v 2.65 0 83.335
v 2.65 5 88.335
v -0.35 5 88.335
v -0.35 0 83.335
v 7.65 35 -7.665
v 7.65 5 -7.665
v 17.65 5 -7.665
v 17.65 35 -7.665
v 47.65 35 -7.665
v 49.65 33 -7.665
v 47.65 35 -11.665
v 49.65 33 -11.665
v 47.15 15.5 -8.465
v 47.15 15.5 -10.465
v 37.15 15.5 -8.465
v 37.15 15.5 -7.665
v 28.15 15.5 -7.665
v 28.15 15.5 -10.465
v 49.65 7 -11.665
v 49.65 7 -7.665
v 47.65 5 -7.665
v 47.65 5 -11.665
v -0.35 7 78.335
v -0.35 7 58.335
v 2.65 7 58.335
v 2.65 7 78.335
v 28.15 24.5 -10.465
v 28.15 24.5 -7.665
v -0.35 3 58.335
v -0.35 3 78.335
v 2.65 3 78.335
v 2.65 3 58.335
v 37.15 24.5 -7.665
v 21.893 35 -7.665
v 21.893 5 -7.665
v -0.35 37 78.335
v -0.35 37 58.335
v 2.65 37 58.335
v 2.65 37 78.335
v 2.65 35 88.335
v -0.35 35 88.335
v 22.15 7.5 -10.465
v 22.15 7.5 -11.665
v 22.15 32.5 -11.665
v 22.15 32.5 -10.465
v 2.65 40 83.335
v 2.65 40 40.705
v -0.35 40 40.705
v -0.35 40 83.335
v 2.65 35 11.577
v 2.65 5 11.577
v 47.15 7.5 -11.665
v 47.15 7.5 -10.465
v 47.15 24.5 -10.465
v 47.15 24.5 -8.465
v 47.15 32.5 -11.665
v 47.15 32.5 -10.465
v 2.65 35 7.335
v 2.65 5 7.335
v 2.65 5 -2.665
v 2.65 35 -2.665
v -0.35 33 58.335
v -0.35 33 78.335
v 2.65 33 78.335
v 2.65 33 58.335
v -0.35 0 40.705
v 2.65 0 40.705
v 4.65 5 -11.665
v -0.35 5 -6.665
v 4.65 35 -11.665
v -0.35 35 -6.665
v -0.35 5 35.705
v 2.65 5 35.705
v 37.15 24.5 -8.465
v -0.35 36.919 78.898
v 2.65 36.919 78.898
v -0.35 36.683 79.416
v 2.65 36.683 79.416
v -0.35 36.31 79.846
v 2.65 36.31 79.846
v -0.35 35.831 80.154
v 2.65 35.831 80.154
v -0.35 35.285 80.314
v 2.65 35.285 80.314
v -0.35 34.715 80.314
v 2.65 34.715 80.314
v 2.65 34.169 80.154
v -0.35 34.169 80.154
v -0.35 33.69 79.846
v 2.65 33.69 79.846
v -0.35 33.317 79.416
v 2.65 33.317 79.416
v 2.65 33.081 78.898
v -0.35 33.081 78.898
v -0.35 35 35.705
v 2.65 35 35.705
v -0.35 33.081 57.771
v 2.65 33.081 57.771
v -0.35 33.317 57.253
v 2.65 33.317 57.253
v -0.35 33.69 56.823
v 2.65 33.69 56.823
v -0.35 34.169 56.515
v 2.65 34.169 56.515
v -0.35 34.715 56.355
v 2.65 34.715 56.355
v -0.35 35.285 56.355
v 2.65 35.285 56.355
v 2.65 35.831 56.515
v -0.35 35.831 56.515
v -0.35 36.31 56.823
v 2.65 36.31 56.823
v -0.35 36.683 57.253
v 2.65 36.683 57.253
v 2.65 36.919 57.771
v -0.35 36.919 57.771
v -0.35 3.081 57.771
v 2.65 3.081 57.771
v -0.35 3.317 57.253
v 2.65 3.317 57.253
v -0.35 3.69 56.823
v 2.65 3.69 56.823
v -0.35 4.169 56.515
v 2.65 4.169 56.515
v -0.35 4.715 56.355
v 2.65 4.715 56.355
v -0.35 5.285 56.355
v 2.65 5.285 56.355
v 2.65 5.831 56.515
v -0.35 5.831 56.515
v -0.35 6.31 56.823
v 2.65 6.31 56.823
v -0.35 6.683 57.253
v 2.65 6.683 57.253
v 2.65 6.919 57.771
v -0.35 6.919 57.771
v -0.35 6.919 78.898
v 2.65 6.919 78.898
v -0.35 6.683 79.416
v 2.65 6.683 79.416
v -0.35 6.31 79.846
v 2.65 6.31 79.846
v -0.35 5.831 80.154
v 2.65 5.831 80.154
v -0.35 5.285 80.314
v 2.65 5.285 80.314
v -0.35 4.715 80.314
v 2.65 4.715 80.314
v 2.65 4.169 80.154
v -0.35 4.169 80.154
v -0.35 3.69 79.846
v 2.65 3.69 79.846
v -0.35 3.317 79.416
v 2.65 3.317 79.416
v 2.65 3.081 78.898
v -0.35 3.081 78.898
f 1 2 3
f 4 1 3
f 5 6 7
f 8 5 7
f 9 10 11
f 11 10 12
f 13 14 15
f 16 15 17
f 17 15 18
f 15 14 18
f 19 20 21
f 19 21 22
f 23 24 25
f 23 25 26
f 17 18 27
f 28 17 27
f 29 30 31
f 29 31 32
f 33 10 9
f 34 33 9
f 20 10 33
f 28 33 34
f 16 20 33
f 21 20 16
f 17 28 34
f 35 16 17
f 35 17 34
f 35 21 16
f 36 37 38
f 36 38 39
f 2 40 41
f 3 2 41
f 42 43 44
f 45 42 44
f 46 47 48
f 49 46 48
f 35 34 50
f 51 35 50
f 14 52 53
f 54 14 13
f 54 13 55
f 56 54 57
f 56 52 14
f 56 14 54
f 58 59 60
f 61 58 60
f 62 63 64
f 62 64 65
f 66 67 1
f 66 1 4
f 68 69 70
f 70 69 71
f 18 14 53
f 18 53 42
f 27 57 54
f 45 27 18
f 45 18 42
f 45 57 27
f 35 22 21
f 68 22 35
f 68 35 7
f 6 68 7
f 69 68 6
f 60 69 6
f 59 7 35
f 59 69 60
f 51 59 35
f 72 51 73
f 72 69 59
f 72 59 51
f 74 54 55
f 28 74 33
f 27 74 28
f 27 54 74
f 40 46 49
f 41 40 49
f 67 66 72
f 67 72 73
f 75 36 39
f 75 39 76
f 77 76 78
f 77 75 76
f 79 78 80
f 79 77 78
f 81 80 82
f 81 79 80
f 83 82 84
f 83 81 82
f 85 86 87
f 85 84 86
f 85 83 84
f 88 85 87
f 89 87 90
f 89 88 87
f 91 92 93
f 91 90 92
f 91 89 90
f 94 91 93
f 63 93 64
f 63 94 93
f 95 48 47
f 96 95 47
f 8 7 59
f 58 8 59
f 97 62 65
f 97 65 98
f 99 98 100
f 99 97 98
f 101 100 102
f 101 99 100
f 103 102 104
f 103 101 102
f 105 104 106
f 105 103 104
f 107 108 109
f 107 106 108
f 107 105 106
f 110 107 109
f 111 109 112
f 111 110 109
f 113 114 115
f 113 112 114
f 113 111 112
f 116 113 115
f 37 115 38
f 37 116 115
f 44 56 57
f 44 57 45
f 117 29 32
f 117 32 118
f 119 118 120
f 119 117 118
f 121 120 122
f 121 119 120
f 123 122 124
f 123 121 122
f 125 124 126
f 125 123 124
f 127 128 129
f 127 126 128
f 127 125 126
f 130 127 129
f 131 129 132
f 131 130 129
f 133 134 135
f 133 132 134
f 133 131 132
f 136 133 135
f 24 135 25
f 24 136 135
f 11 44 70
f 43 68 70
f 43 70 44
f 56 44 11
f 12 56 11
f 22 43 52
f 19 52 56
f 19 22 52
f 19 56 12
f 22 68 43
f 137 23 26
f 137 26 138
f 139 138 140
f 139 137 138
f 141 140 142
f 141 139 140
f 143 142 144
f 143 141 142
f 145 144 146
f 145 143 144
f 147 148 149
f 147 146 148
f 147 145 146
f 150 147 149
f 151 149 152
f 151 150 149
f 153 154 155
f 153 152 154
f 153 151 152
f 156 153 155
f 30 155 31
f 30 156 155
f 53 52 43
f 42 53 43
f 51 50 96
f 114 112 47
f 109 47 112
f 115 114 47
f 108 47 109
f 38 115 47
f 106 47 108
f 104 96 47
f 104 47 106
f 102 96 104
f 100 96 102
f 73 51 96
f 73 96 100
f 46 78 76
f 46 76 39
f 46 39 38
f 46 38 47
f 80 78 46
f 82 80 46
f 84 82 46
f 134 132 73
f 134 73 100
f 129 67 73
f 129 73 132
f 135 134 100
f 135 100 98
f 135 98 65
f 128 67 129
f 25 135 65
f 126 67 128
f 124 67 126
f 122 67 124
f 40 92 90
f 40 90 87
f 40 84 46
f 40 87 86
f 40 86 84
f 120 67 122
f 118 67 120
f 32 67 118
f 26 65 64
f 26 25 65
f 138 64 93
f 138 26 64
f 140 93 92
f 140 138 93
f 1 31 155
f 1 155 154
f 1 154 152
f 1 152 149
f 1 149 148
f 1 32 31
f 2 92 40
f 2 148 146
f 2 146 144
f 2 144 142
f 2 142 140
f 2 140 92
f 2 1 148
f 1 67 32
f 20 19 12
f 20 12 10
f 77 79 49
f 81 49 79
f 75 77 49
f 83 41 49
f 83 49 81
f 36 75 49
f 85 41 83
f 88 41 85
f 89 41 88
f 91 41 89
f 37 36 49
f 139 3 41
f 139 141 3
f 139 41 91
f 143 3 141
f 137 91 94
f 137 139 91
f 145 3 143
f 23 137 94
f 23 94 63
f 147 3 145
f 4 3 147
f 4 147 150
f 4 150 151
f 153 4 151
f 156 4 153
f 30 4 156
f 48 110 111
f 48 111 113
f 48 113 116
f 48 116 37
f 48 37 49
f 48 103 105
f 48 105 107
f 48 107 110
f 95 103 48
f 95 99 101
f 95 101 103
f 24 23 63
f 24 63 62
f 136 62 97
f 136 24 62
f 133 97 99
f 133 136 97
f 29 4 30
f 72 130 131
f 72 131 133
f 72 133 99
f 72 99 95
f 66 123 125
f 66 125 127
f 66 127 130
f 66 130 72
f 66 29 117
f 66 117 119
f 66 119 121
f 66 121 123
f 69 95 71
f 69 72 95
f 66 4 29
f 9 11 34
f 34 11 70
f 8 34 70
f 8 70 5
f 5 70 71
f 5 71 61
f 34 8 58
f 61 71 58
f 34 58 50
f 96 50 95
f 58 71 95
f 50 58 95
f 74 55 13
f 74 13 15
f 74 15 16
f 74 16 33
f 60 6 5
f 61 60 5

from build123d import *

# Parameters (mm, degrees)
SALIENTE_EXTRUIR1_DEPTH = 40
CORTAR_EXTRUIR1_DEPTH   = 110.100828683
CHAFL_N1_SIZE           = 5
CROQUIS3_W              = 52.370156311
CROQUIS3_H              = 5
CORTAR_EXTRUIR2_DEPTH   = 110.100828683
CHAFL_N2_SIZE           = 5
CROQUIS4_W              = 25
CROQUIS4_H              = 25
CORTAR_EXTRUIR3_DEPTH   = 1.2
CROQUIS5_W              = 9
CROQUIS5_H              = 9
CORTAR_EXTRUIR4_DEPTH   = 118.586419677
CROQUIS6_W              = 10
CROQUIS6_H              = 9
CORTAR_EXTRUIR5_DEPTH   = 2
CHAFL_N5_SIZE           = 2
CHAFL_N6_SIZE           = 5


with BuildPart() as part:
    # Croquis1 → Saliente-Extruir1 (new body)
    with BuildSketch(Plane(origin=(0, 0, 0), x_dir=(1, 0, 0), z_dir=(0, 1, 0))):
        Polygon((-0.349963823, 11.66546078), (49.650036177, 11.66546078), (49.650036177, 7.66546078), (21.892676864, 7.66546078), (2.650036177, -11.577179907), (2.650036177, -88.33453922), (-0.349963823, -88.33453922), align=None)
        Polygon((17.650036177, 7.66546078), (2.650036177, -7.33453922), (2.650036177, 7.66546078), align=None, mode=Mode.SUBTRACT)
    extrude(amount=SALIENTE_EXTRUIR1_DEPTH)

    # Croquis2 → Cortar-Extruir1 (cut, through all)
    with BuildSketch(Plane.ZY.offset(0.349963823)):
        with BuildLine():
            Line((58.33453922, 37), (78.33453922, 37))
            ThreePointArc((78.33453922, 37), (80.33453922, 35), (78.33453922, 33))
            Line((78.33453922, 33), (58.33453922, 33))
            ThreePointArc((58.33453922, 33), (56.33453922, 35), (58.33453922, 37))
        make_face()
        with BuildLine():
            Line((58.33453922, 7), (78.33453922, 7))
            ThreePointArc((78.33453922, 7), (80.33453922, 5), (78.33453922, 3))
            Line((78.33453922, 3), (58.33453922, 3))
            ThreePointArc((58.33453922, 3), (56.33453922, 5), (58.33453922, 7))
        make_face()
    extrude(amount=-CORTAR_EXTRUIR1_DEPTH, mode=Mode.SUBTRACT)

    # Chaflán1
    chafl_n1_edges = [part.edges().sort_by_distance(p)[0] for p in [
        (-0.349963823, 20, -11.66546078),
        (2.650036177, 20, -7.66546078),
    ]]
    chamfer(chafl_n1_edges, length=CHAFL_N1_SIZE)

    # Croquis3 → Cortar-Extruir2 (cut, through all)
    with BuildSketch(Plane.ZY.offset(0.349963823)):
        with Locations((14.519617376, 2.5)):
            Rectangle(CROQUIS3_W, CROQUIS3_H)
        with Locations((14.519617376, 37.5)):
            Rectangle(CROQUIS3_W, CROQUIS3_H)
    extrude(amount=-CORTAR_EXTRUIR2_DEPTH, mode=Mode.SUBTRACT)

    # Chaflán2
    chafl_n2_edges = [part.edges().sort_by_distance(p)[0] for p in [
        (1.150036177, 35, 40.704695531),
        (1.150036177, 5, 40.704695531),
    ]]
    chamfer(chafl_n2_edges, length=CHAFL_N2_SIZE - 0.0001)  # a hair under: the kernel refuses the full size

    # Croquis4 → Cortar-Extruir3 (cut)
    with BuildSketch(Plane(origin=(0, 0, -11.66546078), x_dir=(-1, 0, 0), z_dir=(0, 0, -1))):
        with Locations((-34.650036177, 20)):
            Rectangle(CROQUIS4_W, CROQUIS4_H)
    extrude(amount=-CORTAR_EXTRUIR3_DEPTH, mode=Mode.SUBTRACT)

    # Croquis5 → Cortar-Extruir4 (cut, through all)
    with BuildSketch(Plane(origin=(0, 0, -10.46546078), x_dir=(-1, 0, 0), z_dir=(0, 0, -1))):
        with Locations((-32.650036177, 20)):
            Rectangle(CROQUIS5_W, CROQUIS5_H)
    extrude(amount=-CORTAR_EXTRUIR4_DEPTH, mode=Mode.SUBTRACT)

    # Croquis6 → Cortar-Extruir5 (cut)
    with BuildSketch(Plane(origin=(0, 0, -10.46546078), x_dir=(-1, 0, 0), z_dir=(0, 0, -1))):
        with Locations((-42.150036177, 20)):
            Rectangle(CROQUIS6_W, CROQUIS6_H)
    extrude(amount=-CORTAR_EXTRUIR5_DEPTH, mode=Mode.SUBTRACT)

    # Chaflán5
    chafl_n5_edges = [part.edges().sort_by_distance(p)[0] for p in [
        (49.650036177, 5, -9.66546078),
        (49.650036177, 35, -9.66546078),
    ]]
    chamfer(chafl_n5_edges, length=CHAFL_N5_SIZE)

    # Chaflán6
    chafl_n6_edges = [part.edges().sort_by_distance(p)[0] for p in [
        (1.150036177, 40, 88.33453922),
        (1.150036177, 0, 88.33453922),
    ]]
    chamfer(chafl_n6_edges, length=CHAFL_N6_SIZE)


solid = part.part
